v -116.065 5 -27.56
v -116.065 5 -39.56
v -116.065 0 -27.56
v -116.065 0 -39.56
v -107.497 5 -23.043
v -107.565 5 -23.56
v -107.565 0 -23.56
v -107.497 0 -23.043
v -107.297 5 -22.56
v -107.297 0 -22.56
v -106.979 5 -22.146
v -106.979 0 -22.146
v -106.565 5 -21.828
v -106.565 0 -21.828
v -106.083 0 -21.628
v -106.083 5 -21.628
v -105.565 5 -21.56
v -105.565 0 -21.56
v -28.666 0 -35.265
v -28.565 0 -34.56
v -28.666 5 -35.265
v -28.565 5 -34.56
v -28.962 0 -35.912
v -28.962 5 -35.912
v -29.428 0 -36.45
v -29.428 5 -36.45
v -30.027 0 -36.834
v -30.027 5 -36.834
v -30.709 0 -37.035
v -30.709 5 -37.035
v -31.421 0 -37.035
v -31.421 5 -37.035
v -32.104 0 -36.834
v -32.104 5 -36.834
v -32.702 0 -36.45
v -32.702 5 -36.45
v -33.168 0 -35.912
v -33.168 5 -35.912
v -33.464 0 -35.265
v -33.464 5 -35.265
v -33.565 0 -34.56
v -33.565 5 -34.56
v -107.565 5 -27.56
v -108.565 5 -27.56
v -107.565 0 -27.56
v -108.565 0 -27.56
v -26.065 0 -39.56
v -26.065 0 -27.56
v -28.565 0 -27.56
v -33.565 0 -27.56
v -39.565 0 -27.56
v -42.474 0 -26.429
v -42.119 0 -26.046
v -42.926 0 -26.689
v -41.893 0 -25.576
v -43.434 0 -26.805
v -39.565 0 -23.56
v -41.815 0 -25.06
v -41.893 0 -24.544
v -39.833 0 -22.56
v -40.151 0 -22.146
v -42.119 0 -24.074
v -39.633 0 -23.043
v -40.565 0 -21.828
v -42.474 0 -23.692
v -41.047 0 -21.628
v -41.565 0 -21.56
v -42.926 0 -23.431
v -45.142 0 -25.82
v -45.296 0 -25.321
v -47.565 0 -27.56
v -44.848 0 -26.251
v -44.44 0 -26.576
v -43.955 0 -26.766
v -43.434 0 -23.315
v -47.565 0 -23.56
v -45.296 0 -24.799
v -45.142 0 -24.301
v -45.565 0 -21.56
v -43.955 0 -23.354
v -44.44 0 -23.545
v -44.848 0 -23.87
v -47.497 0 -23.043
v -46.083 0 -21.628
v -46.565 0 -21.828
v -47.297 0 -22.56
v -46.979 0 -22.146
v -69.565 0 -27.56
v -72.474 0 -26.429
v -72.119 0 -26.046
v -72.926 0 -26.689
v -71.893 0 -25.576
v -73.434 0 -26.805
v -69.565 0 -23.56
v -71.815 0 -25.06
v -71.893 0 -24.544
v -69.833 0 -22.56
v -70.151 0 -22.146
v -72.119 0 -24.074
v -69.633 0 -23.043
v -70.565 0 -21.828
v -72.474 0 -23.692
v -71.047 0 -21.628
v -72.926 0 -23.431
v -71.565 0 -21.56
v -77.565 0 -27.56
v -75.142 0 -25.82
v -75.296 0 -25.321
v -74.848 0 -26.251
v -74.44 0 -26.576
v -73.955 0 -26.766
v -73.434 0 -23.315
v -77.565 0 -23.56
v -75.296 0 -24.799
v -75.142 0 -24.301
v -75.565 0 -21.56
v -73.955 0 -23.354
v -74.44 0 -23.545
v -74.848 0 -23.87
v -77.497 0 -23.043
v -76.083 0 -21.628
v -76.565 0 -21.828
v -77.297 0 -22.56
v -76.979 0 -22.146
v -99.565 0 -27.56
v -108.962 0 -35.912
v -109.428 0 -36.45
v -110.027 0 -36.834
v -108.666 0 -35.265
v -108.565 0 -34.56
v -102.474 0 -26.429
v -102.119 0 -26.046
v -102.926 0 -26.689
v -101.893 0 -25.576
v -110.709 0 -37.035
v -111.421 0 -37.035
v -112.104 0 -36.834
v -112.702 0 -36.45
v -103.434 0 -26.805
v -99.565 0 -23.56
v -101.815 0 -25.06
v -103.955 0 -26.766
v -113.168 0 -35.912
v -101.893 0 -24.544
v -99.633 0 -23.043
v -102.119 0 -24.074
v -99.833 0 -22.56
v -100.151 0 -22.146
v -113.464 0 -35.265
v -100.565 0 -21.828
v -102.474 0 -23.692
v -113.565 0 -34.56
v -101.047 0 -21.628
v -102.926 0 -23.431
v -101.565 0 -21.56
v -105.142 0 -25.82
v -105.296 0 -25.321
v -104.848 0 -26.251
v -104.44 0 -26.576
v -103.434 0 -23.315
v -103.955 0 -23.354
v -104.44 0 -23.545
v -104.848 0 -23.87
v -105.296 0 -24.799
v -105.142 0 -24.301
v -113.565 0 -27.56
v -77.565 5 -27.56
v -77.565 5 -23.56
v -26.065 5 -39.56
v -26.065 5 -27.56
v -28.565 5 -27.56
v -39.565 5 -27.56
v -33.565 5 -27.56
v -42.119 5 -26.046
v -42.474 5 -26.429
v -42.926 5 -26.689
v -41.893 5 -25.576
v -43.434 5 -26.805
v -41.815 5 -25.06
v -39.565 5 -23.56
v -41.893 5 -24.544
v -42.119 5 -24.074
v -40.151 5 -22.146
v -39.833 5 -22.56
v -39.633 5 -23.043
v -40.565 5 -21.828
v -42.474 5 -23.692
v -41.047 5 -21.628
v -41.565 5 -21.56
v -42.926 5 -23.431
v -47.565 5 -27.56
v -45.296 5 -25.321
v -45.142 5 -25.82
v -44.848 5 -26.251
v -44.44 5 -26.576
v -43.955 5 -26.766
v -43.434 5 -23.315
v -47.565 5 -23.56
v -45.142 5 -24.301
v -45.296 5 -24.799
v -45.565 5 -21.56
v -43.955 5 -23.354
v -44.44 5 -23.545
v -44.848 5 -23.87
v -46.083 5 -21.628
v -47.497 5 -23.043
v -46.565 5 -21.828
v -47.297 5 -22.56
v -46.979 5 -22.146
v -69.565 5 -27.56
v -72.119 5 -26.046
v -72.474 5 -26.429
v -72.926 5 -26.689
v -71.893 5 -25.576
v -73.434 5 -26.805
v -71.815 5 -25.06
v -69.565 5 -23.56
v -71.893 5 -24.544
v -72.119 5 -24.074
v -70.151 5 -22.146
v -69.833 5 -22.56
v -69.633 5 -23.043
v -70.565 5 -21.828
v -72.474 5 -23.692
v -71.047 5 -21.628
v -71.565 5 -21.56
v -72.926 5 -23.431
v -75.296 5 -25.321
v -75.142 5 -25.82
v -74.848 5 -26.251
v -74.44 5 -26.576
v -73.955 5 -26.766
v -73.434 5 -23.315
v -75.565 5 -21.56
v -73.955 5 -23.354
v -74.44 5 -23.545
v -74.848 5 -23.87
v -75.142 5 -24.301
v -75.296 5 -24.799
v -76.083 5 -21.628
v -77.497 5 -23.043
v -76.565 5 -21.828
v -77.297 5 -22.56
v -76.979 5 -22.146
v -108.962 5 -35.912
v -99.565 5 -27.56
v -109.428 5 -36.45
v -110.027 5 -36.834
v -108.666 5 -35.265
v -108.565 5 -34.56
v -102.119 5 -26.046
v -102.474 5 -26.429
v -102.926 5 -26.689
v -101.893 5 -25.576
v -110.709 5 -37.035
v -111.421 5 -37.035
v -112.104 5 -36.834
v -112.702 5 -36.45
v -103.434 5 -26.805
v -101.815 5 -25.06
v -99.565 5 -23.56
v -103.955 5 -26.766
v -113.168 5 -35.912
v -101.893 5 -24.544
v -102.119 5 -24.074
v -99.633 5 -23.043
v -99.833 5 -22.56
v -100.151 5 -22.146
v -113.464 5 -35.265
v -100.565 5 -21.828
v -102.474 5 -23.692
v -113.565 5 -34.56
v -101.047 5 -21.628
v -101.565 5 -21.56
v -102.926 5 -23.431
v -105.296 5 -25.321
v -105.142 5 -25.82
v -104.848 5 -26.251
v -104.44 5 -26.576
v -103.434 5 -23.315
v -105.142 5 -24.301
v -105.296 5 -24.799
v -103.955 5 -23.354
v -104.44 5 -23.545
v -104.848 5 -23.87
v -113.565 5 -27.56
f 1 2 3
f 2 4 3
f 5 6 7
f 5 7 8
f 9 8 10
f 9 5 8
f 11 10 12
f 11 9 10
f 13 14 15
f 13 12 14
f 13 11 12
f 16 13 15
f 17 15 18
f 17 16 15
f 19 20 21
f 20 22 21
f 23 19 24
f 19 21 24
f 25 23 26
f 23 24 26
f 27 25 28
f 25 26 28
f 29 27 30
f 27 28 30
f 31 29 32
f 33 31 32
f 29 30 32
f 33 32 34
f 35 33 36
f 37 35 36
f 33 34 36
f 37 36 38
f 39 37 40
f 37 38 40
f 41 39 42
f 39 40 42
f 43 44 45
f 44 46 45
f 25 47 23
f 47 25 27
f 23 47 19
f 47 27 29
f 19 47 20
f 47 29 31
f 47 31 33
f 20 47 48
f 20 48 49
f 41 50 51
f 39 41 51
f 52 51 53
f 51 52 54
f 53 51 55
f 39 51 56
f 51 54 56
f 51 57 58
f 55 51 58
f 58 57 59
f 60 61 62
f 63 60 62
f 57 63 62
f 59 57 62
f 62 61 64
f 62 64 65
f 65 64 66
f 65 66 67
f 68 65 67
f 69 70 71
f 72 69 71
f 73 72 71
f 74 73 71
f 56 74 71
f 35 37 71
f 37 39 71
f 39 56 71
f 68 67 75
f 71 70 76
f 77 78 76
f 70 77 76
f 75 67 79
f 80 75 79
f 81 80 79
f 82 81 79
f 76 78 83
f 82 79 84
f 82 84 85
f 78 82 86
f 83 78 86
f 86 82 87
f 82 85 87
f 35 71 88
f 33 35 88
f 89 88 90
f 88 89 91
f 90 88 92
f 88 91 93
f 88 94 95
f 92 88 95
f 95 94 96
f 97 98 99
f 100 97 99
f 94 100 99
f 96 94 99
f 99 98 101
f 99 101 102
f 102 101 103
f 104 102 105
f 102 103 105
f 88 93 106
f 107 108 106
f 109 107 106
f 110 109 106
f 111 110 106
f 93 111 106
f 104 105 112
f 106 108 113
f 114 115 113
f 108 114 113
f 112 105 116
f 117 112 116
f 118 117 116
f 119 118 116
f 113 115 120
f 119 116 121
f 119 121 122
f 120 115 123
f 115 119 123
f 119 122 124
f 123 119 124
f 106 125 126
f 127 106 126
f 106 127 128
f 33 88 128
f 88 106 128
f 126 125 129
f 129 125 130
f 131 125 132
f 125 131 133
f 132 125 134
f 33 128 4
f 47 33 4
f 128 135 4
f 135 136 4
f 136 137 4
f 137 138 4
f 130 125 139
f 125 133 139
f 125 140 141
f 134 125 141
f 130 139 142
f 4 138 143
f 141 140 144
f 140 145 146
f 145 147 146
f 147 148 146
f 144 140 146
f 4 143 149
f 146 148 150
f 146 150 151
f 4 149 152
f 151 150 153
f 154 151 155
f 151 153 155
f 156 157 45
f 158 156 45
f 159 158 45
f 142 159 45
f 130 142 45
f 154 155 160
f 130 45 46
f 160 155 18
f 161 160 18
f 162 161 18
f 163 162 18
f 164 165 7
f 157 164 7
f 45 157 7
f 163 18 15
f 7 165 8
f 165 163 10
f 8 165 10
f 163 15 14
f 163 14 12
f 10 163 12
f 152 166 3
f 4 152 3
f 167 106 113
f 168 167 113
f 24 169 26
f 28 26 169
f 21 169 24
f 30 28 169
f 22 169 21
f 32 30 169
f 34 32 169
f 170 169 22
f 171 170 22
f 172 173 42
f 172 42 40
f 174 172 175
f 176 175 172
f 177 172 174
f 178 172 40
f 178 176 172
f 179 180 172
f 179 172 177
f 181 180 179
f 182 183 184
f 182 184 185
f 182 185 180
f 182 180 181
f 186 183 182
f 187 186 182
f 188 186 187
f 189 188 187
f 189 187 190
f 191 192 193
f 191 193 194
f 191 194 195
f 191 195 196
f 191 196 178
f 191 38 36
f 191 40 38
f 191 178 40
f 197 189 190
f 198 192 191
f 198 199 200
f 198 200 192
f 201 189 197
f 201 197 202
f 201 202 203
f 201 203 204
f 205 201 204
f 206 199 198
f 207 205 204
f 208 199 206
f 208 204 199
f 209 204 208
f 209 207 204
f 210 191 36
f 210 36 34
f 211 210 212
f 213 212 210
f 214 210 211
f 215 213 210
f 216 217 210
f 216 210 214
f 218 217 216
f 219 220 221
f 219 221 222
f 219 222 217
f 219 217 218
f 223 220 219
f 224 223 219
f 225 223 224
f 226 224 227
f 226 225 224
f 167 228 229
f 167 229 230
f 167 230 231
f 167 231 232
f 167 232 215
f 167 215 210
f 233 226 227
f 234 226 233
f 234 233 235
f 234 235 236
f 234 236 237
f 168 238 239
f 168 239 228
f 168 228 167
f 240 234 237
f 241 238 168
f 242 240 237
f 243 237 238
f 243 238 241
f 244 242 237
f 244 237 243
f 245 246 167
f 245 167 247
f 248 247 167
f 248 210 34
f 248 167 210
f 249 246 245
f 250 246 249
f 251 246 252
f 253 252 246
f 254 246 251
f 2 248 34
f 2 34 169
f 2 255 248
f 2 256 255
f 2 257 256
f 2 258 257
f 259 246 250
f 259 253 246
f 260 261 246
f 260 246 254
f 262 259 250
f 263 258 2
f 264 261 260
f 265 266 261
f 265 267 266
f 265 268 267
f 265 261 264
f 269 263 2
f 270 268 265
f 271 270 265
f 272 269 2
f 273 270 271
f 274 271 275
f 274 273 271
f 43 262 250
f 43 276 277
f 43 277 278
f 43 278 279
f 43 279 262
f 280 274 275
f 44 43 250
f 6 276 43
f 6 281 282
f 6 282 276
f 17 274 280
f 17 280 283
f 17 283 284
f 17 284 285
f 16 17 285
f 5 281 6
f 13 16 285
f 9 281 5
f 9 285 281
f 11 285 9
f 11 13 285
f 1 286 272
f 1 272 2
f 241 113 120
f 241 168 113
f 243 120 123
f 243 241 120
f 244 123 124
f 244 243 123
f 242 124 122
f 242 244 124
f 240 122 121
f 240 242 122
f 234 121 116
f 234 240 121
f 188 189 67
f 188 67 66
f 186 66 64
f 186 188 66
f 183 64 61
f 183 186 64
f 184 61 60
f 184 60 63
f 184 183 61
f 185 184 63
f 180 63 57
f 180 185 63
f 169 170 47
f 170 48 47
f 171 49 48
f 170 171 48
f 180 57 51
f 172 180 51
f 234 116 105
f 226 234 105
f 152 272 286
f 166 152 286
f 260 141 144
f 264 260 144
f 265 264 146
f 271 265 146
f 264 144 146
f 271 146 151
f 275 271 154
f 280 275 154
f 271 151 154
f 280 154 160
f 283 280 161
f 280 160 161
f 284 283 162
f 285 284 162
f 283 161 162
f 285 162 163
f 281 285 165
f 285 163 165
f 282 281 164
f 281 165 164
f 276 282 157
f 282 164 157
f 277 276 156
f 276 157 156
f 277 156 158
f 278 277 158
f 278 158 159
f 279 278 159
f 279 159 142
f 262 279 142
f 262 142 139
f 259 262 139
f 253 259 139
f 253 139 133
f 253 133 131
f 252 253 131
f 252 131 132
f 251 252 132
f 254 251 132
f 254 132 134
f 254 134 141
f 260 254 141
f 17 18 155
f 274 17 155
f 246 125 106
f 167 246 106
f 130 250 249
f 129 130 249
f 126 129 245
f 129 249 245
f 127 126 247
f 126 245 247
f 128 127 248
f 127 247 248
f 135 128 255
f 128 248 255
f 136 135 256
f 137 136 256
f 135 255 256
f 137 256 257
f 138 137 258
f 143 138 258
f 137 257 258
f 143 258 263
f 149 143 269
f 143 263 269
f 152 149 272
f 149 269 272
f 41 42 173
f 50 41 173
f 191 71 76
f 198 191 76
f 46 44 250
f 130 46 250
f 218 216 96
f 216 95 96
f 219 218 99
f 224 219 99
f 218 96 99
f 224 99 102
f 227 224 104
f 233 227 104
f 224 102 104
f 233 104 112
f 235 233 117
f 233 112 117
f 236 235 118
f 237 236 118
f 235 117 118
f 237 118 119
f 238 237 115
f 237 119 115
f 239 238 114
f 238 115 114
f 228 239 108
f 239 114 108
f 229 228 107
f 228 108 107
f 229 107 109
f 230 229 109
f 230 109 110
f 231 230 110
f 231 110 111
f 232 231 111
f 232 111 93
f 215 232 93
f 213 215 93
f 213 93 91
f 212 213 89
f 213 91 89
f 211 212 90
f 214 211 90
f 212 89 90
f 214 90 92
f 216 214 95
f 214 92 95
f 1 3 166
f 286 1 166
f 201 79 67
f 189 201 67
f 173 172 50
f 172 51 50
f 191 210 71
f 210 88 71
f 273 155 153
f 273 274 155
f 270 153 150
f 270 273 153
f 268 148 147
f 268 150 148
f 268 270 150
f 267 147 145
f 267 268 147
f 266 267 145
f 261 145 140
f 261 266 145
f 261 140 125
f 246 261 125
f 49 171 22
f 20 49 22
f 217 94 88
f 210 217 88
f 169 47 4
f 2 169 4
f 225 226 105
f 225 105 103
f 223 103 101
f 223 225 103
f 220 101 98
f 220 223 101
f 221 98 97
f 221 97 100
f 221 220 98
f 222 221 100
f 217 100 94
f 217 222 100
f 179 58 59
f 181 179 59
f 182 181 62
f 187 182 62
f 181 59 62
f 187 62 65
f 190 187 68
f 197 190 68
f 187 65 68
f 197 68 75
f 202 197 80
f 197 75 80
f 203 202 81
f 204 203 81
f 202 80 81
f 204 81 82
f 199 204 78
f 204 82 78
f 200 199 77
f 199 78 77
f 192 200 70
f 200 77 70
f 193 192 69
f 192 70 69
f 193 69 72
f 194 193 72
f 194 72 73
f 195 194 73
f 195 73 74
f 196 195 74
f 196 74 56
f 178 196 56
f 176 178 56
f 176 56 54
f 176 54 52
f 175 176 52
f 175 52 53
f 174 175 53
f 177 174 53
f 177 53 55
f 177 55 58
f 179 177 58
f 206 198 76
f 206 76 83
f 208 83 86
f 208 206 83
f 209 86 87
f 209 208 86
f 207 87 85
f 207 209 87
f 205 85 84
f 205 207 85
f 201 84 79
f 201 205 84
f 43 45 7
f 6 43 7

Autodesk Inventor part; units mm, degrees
ref_plane "YZ Plane" through (0, 0, 0) normal (1, 0, 0) x (0, 1, 0)
ref_plane "XZ Plane" through (0, 0, 0) normal (0, 1, 0) x (-1, 0, 0)
ref_plane "XY Plane" through (0, 0, 0) normal (0, 0, 1) x (1, 0, 0)
sketch "Sketch1" plane through (0, 0, 0) normal (0, 1, 0) x (-1, 0, 0)
  line L0 (26.0651, -39.5603) -> (116.0651, -39.5603)
  line L1 (116.0651, -39.5603) -> (116.0651, -27.5603)
  line L2 (116.0651, -27.5603) -> (26.0651, -27.5603)
  line L3 (26.0651, -27.5603) -> (26.0651, -39.5603)
  line L4 (39.5651, -27.5603) -> (47.5651, -27.5603)
  line L5 (47.5651, -27.5603) -> (47.5651, -21.5603)
  line L6 (47.5651, -21.5603) -> (39.5651, -21.5603)
  line L7 (39.5651, -21.5603) -> (39.5651, -27.5603)
  line L8 (69.5651, -27.5603) -> (77.5651, -27.5603)
  line L9 (77.5651, -27.5603) -> (77.5651, -21.5603)
  line L10 (77.5651, -21.5603) -> (69.5651, -21.5603)
  line L11 (69.5651, -21.5603) -> (69.5651, -27.5603)
  line L12 (99.5651, -27.5603) -> (107.5651, -27.5603)
  line L13 (107.5651, -27.5603) -> (107.5651, -21.5603)
  line L14 (107.5651, -21.5603) -> (99.5651, -21.5603)
  line L15 (99.5651, -21.5603) -> (99.5651, -27.5603)
  point P0 (0, 0)
  dimension "d0" = 90
  dimension "d3" = 12
  dimension "d4" = 21.5
  dimension "d5" = 30
  dimension "d6" = 30
  dimension "d7" = 6
  dimension "d8" = 6
  dimension "d9" = 6
  dimension "d10" = 8
  dimension "d11" = 8
  dimension "d12" = 8
extrude "Extrusion1" add sketch "Sketch1" along normal blind 5
fillet "Fillet1" radius 2 1 edges at (-99.5651, 2.5, -21.5603)
fillet "Fillet2" radius 2 1 edges at (-107.5651, 2.5, -21.5603)
fillet "Fillet3" radius 2 1 edges at (-77.5651, 2.5, -21.5603)
fillet "Fillet4" radius 2 1 edges at (-69.5651, 2.5, -21.5603)
fillet "Fillet5" radius 2 1 edges at (-47.5651, 2.5, -21.5603)
fillet "Fillet6" radius 2 1 edges at (-39.5651, 2.5, -21.5603)
sketch "Sketch2" plane through (0, 0, 0) normal (0, -1, 0) x (1, 0, 0)
  line L0 (-39.5651, -23.5603) -> (-39.5651, -27.5603) projected
  circle A0 centre (-103.5651, -25.0603) radius 1.75
  circle A1 centre (-73.5651, -25.0603) radius 1.75
  circle A2 centre (-43.5651, -25.0603) radius 1.75
  line L1 (-69.5651, -27.5603) -> (-47.5651, -27.5603) projected
  line L2 (-69.5651, -23.5603) -> (-69.5651, -27.5603) projected
  line L3 (-99.5651, -27.5603) -> (-77.5651, -27.5603) projected
  line L4 (-99.5651, -23.5603) -> (-99.5651, -27.5603) projected
  line L5 (-39.5651, -27.5603) -> (-26.0651, -27.5603) projected
  point P0 (0, 0)
  dimension "d23" = 3.5
  dimension "d29" = 3.5
  dimension "d30" = 3.5
  dimension "d47" = 2.5
  dimension "d48" = 4
  dimension "d49" = 2.5
  dimension "d50" = 4
  dimension "d51" = 2.5
  dimension "d52" = 4
extrude "Extrusion2" cut sketch "Sketch2" against normal blind 10
sketch "Sketch4" plane through (0, 5, 0) normal (0, 1, 0) x (1, 0, 0)
  line L0 (-26.0651, 27.5603) -> (-26.0651, 39.5603) projected
  line L1 (-26.0651, 39.5603) -> (-116.0651, 39.5603) projected
  line L2 (-116.0651, 39.5603) -> (-116.0651, 27.5603) projected
  arc A0 (-108.5651, 34.5603) -> (-113.5651, 34.5603) centre (-111.0651, 34.5603) ccw
  arc A1 (-28.5651, 34.5603) -> (-33.5651, 34.5603) centre (-31.0651, 34.5603) ccw
  line L3 (-113.5651, 27.5603) -> (-108.5651, 27.5603)
  line L4 (-108.5651, 27.5603) -> (-108.5651, 34.5603)
  line L5 (-113.5651, 34.5603) -> (-113.5651, 27.5603)
  line L6 (-33.5651, 27.5603) -> (-28.5651, 27.5603)
  line L7 (-28.5651, 27.5603) -> (-28.5651, 34.5603)
  line L8 (-33.5651, 34.5603) -> (-33.5651, 27.5603)
  line L9 (-39.5651, 27.5603) -> (-26.0651, 27.5603) projected
  line L10 (-116.0651, 27.5603) -> (-107.5651, 27.5603) projected
  point P0 (0, 0)
  dimension "d53" = 5
  dimension "d54" = 5
  dimension "d55" = 5
  dimension "d56" = 5
  dimension "d57" = 5
  dimension "d58" = 5
extrude "Extrusion4" cut sketch "Sketch4" against normal blind 10
equation "\"d8\" = d7"
equation "\"d9\" = d7"
properties part number "RodHolderV4" material "Copper"
